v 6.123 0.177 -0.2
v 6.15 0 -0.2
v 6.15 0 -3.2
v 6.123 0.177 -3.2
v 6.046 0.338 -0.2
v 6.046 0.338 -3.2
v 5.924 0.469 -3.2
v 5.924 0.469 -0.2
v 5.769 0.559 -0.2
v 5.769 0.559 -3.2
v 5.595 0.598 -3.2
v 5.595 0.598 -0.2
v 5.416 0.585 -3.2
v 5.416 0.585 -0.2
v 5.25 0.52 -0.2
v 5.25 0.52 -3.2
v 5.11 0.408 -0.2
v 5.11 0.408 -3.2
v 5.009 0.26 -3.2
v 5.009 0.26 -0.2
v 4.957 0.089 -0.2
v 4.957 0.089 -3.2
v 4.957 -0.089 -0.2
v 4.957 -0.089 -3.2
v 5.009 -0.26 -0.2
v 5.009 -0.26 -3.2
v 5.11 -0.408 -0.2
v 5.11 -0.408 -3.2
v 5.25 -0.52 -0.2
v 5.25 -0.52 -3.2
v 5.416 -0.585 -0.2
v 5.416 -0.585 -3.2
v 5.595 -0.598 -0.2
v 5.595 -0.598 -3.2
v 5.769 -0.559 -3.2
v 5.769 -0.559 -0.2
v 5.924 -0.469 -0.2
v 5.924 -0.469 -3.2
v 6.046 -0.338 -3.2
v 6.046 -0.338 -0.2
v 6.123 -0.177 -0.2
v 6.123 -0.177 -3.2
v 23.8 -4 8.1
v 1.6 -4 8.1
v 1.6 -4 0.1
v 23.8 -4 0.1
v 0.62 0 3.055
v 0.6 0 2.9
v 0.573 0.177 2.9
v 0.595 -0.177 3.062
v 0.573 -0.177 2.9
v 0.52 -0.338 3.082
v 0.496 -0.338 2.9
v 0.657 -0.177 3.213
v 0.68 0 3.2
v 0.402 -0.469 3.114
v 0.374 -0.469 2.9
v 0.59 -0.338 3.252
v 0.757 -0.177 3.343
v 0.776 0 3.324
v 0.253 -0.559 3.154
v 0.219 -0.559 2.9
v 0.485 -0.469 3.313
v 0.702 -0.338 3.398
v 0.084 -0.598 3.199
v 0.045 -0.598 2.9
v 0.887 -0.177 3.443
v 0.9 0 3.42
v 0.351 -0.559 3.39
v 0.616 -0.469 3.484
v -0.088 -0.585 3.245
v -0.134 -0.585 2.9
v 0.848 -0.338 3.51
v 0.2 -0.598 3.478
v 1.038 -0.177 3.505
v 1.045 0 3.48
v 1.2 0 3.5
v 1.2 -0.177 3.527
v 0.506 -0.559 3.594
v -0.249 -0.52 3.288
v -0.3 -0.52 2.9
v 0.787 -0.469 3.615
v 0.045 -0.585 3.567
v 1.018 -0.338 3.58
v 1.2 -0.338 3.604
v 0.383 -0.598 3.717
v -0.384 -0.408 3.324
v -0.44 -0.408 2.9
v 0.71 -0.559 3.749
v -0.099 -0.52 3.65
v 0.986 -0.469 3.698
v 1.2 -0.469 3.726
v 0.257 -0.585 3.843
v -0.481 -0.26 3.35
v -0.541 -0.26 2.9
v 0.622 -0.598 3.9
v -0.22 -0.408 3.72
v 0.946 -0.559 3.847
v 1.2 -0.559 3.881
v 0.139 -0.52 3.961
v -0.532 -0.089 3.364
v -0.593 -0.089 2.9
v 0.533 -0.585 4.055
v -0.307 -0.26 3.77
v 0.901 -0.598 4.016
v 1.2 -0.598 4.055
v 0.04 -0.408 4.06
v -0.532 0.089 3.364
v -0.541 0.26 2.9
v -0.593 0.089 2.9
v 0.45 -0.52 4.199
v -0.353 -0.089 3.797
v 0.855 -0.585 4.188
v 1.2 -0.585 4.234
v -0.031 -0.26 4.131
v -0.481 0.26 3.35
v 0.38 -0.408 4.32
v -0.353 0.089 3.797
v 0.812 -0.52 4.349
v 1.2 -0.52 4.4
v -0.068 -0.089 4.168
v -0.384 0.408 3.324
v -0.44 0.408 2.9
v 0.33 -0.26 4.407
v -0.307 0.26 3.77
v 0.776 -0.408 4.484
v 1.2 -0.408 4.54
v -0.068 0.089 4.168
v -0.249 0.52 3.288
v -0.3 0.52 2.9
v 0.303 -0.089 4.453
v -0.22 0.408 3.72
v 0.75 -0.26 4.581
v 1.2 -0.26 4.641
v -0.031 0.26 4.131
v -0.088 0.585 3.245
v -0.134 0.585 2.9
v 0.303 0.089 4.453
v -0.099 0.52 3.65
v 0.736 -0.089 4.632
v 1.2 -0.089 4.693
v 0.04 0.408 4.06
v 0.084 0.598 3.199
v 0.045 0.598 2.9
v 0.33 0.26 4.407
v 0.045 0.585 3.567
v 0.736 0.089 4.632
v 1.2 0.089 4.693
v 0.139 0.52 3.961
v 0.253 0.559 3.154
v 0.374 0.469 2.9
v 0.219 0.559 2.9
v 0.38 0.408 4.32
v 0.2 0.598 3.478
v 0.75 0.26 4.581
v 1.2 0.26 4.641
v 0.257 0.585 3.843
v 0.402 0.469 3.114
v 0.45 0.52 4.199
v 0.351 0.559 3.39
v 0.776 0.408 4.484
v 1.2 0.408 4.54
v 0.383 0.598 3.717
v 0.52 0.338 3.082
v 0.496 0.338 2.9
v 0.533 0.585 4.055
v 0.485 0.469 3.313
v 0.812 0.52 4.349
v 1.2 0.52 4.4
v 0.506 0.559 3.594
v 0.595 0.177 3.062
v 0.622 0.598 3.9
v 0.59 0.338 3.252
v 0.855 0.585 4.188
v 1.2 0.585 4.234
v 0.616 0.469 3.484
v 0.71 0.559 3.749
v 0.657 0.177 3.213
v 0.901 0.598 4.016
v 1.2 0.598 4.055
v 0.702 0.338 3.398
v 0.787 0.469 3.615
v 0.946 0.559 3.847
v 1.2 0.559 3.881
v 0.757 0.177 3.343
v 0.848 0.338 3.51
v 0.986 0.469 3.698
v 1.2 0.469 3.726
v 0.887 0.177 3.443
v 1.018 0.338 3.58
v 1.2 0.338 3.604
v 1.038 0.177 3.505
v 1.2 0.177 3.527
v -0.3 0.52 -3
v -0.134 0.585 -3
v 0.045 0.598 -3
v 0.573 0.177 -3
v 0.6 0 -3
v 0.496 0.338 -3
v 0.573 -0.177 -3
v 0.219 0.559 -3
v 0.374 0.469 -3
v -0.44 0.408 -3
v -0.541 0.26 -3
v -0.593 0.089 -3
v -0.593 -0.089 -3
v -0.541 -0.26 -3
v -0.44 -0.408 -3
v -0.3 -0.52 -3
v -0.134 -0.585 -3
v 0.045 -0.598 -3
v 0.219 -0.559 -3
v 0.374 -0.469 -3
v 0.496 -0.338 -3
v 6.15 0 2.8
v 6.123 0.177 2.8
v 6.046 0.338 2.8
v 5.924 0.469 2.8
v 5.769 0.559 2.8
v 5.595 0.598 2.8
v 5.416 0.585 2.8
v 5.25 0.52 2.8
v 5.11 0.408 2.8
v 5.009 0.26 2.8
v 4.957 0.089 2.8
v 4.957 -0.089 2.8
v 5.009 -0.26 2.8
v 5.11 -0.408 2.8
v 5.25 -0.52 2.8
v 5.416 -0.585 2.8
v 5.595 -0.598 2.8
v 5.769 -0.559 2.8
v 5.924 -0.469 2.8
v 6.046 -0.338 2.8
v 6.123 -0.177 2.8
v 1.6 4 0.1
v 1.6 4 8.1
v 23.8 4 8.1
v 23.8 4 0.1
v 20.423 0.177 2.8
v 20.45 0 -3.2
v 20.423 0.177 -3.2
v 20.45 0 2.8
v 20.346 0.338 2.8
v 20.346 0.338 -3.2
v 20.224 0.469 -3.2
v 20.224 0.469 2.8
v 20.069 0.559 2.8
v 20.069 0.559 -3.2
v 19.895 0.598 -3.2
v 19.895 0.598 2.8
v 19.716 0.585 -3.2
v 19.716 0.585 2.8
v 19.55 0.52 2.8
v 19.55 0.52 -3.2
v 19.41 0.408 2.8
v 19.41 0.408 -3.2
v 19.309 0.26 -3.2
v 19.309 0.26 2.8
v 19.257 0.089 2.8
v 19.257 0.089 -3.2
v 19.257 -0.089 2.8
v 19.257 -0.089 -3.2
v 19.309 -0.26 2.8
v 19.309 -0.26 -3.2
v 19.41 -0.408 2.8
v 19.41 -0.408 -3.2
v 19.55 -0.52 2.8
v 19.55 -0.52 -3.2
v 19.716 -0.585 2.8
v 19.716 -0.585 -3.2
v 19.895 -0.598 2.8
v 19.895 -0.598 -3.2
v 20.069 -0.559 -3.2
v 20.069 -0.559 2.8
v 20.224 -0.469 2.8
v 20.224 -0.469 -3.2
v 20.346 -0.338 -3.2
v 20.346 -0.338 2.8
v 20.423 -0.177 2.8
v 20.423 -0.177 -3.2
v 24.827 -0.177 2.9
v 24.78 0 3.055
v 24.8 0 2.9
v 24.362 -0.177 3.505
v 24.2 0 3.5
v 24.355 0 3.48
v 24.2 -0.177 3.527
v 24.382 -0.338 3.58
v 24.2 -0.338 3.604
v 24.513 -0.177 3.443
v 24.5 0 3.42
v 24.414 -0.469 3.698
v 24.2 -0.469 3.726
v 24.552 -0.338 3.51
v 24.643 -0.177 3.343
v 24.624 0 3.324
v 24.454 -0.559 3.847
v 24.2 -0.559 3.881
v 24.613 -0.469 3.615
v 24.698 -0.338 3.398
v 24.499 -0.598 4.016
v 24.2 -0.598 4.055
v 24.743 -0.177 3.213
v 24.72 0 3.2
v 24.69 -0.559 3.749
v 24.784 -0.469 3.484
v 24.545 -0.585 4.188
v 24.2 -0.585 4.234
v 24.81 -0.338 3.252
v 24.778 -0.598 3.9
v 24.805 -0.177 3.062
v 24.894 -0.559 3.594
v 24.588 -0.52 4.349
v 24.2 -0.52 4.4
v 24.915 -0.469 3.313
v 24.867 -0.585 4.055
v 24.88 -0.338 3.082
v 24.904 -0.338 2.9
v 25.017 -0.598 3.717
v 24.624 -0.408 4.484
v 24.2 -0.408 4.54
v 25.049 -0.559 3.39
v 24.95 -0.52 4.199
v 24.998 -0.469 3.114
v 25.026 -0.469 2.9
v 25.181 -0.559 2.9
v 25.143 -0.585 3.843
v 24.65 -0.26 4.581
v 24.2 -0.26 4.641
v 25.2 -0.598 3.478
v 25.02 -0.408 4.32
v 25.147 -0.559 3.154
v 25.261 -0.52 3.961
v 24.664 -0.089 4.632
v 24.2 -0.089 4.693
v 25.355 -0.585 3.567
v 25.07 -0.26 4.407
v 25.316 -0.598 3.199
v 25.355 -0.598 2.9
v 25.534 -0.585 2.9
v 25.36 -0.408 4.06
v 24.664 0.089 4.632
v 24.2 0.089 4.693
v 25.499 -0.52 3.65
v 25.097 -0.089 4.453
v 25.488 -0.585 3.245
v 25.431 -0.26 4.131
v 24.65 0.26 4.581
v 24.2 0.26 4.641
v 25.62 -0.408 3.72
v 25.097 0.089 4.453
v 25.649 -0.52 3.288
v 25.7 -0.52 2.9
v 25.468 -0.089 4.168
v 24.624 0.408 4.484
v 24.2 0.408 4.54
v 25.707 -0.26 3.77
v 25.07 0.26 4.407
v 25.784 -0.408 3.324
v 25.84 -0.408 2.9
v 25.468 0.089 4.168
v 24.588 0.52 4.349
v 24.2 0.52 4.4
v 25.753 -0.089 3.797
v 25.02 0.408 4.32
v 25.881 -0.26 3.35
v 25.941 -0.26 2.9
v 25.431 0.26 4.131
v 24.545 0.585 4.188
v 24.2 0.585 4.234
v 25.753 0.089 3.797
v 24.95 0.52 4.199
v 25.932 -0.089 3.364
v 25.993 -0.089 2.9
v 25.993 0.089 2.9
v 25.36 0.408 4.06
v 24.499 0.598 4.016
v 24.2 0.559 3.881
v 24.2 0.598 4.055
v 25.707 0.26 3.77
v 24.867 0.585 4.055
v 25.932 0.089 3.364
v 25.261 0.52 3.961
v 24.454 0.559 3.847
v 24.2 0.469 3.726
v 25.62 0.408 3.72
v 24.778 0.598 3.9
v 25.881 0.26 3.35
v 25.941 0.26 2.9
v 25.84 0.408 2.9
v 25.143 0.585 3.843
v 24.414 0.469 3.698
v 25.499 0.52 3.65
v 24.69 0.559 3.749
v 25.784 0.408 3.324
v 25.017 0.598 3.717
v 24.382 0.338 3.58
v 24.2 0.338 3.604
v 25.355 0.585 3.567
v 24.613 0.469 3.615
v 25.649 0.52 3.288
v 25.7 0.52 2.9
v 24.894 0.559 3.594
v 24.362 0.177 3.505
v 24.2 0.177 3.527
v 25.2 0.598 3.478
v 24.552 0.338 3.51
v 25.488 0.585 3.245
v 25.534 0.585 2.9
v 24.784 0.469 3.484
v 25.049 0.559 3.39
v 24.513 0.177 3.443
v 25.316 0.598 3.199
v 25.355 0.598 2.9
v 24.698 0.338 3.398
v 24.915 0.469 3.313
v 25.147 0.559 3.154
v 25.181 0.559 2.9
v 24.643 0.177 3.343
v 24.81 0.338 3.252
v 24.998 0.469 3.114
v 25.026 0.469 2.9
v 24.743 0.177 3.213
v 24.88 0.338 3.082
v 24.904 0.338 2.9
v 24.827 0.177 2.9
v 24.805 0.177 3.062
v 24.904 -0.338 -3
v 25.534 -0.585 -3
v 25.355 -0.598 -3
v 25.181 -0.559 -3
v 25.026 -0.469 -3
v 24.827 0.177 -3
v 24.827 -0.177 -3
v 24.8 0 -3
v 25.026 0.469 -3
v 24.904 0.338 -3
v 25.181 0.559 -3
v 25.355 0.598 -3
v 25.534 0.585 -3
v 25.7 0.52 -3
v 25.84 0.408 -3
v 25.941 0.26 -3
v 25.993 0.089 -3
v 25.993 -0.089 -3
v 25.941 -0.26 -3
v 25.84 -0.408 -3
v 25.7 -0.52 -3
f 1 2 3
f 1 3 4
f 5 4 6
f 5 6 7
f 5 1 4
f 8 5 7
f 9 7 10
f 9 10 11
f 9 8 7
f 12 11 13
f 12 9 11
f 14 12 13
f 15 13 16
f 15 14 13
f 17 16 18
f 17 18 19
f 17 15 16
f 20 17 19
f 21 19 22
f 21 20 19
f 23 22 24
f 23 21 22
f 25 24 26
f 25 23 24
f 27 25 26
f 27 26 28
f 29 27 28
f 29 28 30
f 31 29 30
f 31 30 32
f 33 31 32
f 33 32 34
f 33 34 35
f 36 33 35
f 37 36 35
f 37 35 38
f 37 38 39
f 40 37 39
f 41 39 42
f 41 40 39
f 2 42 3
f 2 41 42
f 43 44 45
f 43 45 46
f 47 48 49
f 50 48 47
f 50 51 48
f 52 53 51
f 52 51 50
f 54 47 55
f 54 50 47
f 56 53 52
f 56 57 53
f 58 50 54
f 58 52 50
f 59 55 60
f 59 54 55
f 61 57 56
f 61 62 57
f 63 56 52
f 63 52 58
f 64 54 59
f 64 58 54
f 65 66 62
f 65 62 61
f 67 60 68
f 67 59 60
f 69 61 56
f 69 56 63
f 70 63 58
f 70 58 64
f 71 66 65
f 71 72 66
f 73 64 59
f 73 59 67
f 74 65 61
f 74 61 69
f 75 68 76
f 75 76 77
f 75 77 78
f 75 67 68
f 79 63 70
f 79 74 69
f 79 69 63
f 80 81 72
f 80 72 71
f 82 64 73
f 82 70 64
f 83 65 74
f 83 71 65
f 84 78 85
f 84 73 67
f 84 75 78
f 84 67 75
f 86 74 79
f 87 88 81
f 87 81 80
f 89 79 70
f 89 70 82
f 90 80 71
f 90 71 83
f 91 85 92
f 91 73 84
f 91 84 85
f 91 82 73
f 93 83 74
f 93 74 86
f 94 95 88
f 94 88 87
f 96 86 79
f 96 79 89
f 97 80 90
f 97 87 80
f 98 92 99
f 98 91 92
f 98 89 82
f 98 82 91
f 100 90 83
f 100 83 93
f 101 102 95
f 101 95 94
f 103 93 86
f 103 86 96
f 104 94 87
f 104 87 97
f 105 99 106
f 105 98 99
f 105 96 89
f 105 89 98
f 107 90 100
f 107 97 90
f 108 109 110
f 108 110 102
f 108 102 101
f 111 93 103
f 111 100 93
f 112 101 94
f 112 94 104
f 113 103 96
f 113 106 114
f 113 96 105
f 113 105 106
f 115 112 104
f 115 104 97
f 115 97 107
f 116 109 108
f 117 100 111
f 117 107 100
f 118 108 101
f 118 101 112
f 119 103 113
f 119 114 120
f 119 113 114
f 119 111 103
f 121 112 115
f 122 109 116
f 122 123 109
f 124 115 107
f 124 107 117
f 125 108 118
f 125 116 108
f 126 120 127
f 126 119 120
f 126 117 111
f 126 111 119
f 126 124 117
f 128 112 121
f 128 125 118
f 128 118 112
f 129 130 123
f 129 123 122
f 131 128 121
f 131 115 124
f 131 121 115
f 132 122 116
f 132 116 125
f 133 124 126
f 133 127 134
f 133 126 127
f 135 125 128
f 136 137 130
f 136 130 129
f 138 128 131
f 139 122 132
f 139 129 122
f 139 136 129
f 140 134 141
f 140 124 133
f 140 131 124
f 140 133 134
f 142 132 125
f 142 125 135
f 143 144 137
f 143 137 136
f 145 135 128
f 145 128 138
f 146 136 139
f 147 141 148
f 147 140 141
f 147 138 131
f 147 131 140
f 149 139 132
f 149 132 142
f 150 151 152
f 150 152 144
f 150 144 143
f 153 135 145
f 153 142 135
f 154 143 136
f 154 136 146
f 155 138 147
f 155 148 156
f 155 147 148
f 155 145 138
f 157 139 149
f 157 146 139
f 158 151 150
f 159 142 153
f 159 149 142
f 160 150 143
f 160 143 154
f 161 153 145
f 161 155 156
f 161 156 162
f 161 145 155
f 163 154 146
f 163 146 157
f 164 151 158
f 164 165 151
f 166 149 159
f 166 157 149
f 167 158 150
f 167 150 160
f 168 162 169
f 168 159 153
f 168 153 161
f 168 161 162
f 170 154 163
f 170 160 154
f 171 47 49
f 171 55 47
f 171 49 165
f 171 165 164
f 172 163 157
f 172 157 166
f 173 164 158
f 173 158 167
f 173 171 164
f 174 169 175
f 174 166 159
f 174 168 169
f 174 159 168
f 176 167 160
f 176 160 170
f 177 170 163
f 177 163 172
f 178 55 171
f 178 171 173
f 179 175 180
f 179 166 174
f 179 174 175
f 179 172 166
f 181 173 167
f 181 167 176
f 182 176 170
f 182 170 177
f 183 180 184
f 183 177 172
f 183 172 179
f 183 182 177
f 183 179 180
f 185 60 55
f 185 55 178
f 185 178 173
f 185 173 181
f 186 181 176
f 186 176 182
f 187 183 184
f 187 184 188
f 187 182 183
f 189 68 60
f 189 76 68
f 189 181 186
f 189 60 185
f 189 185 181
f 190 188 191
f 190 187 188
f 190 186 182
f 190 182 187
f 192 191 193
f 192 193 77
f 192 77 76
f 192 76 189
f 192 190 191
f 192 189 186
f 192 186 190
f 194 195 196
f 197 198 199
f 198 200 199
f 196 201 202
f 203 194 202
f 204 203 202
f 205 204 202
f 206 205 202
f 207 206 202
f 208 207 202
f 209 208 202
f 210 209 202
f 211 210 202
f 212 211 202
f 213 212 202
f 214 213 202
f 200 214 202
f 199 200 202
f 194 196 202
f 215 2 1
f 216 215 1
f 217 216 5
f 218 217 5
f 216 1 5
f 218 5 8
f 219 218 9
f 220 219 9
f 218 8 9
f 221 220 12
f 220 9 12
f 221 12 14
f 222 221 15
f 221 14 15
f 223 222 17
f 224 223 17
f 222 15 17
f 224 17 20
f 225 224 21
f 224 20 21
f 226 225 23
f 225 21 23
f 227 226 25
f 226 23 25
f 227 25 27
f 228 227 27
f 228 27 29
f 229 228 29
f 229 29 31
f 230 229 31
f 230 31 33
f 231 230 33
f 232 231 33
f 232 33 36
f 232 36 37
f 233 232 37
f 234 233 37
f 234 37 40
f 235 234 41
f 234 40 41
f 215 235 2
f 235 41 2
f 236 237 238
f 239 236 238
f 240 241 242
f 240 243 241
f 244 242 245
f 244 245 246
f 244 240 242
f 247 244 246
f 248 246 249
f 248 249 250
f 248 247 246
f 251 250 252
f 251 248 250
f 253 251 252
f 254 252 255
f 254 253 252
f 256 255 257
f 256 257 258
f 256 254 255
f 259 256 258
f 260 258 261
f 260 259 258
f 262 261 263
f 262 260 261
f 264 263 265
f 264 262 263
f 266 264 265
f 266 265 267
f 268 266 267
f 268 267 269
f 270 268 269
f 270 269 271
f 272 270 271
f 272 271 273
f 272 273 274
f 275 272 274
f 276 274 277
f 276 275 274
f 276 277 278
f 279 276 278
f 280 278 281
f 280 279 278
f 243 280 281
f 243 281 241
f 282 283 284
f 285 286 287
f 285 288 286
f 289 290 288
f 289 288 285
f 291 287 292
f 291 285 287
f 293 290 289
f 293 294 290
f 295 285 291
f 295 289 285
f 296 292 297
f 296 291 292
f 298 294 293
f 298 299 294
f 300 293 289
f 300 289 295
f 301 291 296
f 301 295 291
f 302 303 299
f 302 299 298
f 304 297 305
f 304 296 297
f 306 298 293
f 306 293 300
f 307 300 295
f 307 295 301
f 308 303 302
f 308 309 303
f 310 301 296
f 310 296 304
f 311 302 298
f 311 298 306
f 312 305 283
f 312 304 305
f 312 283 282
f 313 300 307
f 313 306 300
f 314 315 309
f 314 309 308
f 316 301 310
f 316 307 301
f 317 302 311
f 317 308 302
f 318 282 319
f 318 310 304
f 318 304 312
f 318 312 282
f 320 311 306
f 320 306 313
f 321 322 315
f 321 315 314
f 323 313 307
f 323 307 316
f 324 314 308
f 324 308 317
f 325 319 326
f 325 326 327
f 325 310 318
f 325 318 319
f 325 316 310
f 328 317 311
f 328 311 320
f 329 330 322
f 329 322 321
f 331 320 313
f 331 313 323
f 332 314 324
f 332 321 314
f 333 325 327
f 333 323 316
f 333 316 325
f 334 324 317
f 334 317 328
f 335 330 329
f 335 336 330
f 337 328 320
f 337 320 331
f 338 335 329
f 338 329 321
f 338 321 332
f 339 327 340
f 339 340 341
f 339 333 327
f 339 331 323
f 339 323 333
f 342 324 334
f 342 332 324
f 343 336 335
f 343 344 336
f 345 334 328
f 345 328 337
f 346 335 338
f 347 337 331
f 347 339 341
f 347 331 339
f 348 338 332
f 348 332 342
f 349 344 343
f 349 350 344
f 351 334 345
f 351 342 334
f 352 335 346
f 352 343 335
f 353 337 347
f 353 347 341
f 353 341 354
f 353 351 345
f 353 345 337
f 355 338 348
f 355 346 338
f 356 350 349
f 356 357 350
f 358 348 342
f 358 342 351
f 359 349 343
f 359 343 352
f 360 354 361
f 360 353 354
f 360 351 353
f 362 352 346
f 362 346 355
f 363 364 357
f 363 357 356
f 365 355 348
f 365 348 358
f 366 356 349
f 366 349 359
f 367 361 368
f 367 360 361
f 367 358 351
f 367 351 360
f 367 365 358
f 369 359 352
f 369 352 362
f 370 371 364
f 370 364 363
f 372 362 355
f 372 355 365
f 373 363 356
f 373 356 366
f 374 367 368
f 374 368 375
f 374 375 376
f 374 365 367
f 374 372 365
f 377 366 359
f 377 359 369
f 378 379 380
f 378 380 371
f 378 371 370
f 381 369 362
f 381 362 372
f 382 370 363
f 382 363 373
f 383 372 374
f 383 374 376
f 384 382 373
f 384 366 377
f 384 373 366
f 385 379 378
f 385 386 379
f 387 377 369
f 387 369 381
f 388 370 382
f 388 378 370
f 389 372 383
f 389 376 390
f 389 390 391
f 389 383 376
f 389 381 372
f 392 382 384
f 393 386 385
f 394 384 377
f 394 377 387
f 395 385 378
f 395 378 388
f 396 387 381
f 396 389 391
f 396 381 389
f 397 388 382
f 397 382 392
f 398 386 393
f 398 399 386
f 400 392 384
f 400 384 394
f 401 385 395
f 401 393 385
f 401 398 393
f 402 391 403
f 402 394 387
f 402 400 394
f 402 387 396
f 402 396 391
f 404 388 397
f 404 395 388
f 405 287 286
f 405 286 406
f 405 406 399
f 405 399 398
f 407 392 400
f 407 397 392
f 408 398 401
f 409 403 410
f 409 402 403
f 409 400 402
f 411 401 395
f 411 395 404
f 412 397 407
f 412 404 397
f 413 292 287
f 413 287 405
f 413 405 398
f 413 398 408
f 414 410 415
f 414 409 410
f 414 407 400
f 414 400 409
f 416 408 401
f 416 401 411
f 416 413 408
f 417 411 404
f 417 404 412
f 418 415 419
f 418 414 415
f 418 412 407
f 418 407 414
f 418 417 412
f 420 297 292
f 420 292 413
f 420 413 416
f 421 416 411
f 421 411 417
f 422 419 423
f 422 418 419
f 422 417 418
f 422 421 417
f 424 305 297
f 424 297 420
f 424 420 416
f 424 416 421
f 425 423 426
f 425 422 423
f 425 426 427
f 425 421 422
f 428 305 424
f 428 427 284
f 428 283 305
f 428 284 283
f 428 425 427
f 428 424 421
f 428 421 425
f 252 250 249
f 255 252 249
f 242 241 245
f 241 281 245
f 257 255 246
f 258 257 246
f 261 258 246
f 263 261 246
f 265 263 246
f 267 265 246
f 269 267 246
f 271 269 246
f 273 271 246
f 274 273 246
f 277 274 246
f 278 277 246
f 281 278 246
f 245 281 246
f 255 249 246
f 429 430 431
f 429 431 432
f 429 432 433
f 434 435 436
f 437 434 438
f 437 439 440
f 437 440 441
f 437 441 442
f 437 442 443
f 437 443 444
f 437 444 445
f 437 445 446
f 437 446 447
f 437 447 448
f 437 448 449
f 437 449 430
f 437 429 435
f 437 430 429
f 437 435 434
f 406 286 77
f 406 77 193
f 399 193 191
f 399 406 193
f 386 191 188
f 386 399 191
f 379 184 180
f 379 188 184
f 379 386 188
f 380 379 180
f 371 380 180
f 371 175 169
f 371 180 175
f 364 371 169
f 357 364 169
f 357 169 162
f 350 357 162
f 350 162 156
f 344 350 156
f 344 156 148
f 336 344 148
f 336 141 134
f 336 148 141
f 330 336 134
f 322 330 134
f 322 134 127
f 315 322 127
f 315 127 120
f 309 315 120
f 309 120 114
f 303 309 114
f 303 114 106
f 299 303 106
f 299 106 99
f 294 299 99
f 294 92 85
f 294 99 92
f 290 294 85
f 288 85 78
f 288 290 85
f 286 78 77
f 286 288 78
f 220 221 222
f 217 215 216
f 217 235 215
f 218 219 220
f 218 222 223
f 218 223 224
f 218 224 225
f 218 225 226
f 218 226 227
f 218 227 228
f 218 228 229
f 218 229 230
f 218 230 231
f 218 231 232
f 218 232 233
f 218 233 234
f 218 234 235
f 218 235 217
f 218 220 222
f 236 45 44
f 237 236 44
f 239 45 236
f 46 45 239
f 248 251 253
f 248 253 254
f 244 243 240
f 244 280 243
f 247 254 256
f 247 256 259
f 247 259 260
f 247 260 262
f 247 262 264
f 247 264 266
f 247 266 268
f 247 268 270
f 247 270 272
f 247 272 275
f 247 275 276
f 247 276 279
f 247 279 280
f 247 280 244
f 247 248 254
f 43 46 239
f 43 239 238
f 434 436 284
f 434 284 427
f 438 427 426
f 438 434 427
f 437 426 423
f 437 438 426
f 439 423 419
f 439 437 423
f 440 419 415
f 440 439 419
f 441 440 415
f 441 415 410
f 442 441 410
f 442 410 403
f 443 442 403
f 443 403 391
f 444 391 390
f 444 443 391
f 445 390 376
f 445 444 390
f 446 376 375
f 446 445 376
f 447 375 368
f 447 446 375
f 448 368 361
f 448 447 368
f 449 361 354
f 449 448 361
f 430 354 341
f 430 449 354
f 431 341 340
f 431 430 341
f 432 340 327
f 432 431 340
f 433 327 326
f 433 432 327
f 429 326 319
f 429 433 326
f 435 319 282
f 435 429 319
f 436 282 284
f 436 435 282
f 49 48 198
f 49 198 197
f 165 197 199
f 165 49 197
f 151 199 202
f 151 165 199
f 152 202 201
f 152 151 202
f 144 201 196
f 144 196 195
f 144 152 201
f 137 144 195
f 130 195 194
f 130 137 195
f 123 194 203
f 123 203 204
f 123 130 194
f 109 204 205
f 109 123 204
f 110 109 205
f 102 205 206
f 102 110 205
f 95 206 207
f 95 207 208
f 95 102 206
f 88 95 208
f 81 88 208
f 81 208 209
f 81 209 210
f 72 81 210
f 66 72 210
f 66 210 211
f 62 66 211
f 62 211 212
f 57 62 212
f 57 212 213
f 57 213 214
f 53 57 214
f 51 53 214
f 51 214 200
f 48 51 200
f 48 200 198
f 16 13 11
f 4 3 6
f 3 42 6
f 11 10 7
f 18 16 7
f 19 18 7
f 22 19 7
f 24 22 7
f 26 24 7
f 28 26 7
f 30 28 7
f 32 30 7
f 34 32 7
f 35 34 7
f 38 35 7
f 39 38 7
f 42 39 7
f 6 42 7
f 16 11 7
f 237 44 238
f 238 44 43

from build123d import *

# Parameters (mm, degrees)
SKETCH_R     = 0.6
SKETCH002_W  = 22.2
SKETCH002_H  = 8
PAD_DEPTH    = 4
SKETCH004_R  = 0.6
PAD001_DEPTH = 3


with BuildPart() as sweep_body:
    # Sweep: sweep along a path in Sketch001
    with BuildLine(Plane.XZ) as sweep_path:
        Line((0, -3), (0, 2.9))
        ThreePointArc((0, 2.9), (0.351476, 3.748532), (1.200011, 4.1))
        Line((1.200011, 4.1), (24.2, 4.1))
        ThreePointArc((24.2, 4.1), (25.048528, 3.748528), (25.4, 2.9))
        Line((25.4, 2.9), (25.4, -3))
    # Sketch → Sweep (sweep)
    with BuildSketch(Plane.XY.offset(-2)):
        Circle(SKETCH_R)
    sweep(path=sweep_path.line)


with BuildPart() as pad:
    # Sketch002 → Pad (new body, symmetric)
    with BuildSketch(Plane.XZ):
        with Locations((12.7, 4.1)):
            Rectangle(SKETCH002_W, SKETCH002_H)
    extrude(amount=PAD_DEPTH, both=True)


with BuildPart() as pad001:
    # Sketch004 → Pad001 (new body, symmetric)
    with BuildSketch(Plane.XY.offset(-0.2)):
        with Locations((5.55, 0)):
            Circle(SKETCH004_R)
        with Locations((19.85, 0)):
            Circle(SKETCH004_R)
    extrude(amount=PAD001_DEPTH, both=True)


solid = Compound([sweep_body.part, pad.part, pad001.part])
